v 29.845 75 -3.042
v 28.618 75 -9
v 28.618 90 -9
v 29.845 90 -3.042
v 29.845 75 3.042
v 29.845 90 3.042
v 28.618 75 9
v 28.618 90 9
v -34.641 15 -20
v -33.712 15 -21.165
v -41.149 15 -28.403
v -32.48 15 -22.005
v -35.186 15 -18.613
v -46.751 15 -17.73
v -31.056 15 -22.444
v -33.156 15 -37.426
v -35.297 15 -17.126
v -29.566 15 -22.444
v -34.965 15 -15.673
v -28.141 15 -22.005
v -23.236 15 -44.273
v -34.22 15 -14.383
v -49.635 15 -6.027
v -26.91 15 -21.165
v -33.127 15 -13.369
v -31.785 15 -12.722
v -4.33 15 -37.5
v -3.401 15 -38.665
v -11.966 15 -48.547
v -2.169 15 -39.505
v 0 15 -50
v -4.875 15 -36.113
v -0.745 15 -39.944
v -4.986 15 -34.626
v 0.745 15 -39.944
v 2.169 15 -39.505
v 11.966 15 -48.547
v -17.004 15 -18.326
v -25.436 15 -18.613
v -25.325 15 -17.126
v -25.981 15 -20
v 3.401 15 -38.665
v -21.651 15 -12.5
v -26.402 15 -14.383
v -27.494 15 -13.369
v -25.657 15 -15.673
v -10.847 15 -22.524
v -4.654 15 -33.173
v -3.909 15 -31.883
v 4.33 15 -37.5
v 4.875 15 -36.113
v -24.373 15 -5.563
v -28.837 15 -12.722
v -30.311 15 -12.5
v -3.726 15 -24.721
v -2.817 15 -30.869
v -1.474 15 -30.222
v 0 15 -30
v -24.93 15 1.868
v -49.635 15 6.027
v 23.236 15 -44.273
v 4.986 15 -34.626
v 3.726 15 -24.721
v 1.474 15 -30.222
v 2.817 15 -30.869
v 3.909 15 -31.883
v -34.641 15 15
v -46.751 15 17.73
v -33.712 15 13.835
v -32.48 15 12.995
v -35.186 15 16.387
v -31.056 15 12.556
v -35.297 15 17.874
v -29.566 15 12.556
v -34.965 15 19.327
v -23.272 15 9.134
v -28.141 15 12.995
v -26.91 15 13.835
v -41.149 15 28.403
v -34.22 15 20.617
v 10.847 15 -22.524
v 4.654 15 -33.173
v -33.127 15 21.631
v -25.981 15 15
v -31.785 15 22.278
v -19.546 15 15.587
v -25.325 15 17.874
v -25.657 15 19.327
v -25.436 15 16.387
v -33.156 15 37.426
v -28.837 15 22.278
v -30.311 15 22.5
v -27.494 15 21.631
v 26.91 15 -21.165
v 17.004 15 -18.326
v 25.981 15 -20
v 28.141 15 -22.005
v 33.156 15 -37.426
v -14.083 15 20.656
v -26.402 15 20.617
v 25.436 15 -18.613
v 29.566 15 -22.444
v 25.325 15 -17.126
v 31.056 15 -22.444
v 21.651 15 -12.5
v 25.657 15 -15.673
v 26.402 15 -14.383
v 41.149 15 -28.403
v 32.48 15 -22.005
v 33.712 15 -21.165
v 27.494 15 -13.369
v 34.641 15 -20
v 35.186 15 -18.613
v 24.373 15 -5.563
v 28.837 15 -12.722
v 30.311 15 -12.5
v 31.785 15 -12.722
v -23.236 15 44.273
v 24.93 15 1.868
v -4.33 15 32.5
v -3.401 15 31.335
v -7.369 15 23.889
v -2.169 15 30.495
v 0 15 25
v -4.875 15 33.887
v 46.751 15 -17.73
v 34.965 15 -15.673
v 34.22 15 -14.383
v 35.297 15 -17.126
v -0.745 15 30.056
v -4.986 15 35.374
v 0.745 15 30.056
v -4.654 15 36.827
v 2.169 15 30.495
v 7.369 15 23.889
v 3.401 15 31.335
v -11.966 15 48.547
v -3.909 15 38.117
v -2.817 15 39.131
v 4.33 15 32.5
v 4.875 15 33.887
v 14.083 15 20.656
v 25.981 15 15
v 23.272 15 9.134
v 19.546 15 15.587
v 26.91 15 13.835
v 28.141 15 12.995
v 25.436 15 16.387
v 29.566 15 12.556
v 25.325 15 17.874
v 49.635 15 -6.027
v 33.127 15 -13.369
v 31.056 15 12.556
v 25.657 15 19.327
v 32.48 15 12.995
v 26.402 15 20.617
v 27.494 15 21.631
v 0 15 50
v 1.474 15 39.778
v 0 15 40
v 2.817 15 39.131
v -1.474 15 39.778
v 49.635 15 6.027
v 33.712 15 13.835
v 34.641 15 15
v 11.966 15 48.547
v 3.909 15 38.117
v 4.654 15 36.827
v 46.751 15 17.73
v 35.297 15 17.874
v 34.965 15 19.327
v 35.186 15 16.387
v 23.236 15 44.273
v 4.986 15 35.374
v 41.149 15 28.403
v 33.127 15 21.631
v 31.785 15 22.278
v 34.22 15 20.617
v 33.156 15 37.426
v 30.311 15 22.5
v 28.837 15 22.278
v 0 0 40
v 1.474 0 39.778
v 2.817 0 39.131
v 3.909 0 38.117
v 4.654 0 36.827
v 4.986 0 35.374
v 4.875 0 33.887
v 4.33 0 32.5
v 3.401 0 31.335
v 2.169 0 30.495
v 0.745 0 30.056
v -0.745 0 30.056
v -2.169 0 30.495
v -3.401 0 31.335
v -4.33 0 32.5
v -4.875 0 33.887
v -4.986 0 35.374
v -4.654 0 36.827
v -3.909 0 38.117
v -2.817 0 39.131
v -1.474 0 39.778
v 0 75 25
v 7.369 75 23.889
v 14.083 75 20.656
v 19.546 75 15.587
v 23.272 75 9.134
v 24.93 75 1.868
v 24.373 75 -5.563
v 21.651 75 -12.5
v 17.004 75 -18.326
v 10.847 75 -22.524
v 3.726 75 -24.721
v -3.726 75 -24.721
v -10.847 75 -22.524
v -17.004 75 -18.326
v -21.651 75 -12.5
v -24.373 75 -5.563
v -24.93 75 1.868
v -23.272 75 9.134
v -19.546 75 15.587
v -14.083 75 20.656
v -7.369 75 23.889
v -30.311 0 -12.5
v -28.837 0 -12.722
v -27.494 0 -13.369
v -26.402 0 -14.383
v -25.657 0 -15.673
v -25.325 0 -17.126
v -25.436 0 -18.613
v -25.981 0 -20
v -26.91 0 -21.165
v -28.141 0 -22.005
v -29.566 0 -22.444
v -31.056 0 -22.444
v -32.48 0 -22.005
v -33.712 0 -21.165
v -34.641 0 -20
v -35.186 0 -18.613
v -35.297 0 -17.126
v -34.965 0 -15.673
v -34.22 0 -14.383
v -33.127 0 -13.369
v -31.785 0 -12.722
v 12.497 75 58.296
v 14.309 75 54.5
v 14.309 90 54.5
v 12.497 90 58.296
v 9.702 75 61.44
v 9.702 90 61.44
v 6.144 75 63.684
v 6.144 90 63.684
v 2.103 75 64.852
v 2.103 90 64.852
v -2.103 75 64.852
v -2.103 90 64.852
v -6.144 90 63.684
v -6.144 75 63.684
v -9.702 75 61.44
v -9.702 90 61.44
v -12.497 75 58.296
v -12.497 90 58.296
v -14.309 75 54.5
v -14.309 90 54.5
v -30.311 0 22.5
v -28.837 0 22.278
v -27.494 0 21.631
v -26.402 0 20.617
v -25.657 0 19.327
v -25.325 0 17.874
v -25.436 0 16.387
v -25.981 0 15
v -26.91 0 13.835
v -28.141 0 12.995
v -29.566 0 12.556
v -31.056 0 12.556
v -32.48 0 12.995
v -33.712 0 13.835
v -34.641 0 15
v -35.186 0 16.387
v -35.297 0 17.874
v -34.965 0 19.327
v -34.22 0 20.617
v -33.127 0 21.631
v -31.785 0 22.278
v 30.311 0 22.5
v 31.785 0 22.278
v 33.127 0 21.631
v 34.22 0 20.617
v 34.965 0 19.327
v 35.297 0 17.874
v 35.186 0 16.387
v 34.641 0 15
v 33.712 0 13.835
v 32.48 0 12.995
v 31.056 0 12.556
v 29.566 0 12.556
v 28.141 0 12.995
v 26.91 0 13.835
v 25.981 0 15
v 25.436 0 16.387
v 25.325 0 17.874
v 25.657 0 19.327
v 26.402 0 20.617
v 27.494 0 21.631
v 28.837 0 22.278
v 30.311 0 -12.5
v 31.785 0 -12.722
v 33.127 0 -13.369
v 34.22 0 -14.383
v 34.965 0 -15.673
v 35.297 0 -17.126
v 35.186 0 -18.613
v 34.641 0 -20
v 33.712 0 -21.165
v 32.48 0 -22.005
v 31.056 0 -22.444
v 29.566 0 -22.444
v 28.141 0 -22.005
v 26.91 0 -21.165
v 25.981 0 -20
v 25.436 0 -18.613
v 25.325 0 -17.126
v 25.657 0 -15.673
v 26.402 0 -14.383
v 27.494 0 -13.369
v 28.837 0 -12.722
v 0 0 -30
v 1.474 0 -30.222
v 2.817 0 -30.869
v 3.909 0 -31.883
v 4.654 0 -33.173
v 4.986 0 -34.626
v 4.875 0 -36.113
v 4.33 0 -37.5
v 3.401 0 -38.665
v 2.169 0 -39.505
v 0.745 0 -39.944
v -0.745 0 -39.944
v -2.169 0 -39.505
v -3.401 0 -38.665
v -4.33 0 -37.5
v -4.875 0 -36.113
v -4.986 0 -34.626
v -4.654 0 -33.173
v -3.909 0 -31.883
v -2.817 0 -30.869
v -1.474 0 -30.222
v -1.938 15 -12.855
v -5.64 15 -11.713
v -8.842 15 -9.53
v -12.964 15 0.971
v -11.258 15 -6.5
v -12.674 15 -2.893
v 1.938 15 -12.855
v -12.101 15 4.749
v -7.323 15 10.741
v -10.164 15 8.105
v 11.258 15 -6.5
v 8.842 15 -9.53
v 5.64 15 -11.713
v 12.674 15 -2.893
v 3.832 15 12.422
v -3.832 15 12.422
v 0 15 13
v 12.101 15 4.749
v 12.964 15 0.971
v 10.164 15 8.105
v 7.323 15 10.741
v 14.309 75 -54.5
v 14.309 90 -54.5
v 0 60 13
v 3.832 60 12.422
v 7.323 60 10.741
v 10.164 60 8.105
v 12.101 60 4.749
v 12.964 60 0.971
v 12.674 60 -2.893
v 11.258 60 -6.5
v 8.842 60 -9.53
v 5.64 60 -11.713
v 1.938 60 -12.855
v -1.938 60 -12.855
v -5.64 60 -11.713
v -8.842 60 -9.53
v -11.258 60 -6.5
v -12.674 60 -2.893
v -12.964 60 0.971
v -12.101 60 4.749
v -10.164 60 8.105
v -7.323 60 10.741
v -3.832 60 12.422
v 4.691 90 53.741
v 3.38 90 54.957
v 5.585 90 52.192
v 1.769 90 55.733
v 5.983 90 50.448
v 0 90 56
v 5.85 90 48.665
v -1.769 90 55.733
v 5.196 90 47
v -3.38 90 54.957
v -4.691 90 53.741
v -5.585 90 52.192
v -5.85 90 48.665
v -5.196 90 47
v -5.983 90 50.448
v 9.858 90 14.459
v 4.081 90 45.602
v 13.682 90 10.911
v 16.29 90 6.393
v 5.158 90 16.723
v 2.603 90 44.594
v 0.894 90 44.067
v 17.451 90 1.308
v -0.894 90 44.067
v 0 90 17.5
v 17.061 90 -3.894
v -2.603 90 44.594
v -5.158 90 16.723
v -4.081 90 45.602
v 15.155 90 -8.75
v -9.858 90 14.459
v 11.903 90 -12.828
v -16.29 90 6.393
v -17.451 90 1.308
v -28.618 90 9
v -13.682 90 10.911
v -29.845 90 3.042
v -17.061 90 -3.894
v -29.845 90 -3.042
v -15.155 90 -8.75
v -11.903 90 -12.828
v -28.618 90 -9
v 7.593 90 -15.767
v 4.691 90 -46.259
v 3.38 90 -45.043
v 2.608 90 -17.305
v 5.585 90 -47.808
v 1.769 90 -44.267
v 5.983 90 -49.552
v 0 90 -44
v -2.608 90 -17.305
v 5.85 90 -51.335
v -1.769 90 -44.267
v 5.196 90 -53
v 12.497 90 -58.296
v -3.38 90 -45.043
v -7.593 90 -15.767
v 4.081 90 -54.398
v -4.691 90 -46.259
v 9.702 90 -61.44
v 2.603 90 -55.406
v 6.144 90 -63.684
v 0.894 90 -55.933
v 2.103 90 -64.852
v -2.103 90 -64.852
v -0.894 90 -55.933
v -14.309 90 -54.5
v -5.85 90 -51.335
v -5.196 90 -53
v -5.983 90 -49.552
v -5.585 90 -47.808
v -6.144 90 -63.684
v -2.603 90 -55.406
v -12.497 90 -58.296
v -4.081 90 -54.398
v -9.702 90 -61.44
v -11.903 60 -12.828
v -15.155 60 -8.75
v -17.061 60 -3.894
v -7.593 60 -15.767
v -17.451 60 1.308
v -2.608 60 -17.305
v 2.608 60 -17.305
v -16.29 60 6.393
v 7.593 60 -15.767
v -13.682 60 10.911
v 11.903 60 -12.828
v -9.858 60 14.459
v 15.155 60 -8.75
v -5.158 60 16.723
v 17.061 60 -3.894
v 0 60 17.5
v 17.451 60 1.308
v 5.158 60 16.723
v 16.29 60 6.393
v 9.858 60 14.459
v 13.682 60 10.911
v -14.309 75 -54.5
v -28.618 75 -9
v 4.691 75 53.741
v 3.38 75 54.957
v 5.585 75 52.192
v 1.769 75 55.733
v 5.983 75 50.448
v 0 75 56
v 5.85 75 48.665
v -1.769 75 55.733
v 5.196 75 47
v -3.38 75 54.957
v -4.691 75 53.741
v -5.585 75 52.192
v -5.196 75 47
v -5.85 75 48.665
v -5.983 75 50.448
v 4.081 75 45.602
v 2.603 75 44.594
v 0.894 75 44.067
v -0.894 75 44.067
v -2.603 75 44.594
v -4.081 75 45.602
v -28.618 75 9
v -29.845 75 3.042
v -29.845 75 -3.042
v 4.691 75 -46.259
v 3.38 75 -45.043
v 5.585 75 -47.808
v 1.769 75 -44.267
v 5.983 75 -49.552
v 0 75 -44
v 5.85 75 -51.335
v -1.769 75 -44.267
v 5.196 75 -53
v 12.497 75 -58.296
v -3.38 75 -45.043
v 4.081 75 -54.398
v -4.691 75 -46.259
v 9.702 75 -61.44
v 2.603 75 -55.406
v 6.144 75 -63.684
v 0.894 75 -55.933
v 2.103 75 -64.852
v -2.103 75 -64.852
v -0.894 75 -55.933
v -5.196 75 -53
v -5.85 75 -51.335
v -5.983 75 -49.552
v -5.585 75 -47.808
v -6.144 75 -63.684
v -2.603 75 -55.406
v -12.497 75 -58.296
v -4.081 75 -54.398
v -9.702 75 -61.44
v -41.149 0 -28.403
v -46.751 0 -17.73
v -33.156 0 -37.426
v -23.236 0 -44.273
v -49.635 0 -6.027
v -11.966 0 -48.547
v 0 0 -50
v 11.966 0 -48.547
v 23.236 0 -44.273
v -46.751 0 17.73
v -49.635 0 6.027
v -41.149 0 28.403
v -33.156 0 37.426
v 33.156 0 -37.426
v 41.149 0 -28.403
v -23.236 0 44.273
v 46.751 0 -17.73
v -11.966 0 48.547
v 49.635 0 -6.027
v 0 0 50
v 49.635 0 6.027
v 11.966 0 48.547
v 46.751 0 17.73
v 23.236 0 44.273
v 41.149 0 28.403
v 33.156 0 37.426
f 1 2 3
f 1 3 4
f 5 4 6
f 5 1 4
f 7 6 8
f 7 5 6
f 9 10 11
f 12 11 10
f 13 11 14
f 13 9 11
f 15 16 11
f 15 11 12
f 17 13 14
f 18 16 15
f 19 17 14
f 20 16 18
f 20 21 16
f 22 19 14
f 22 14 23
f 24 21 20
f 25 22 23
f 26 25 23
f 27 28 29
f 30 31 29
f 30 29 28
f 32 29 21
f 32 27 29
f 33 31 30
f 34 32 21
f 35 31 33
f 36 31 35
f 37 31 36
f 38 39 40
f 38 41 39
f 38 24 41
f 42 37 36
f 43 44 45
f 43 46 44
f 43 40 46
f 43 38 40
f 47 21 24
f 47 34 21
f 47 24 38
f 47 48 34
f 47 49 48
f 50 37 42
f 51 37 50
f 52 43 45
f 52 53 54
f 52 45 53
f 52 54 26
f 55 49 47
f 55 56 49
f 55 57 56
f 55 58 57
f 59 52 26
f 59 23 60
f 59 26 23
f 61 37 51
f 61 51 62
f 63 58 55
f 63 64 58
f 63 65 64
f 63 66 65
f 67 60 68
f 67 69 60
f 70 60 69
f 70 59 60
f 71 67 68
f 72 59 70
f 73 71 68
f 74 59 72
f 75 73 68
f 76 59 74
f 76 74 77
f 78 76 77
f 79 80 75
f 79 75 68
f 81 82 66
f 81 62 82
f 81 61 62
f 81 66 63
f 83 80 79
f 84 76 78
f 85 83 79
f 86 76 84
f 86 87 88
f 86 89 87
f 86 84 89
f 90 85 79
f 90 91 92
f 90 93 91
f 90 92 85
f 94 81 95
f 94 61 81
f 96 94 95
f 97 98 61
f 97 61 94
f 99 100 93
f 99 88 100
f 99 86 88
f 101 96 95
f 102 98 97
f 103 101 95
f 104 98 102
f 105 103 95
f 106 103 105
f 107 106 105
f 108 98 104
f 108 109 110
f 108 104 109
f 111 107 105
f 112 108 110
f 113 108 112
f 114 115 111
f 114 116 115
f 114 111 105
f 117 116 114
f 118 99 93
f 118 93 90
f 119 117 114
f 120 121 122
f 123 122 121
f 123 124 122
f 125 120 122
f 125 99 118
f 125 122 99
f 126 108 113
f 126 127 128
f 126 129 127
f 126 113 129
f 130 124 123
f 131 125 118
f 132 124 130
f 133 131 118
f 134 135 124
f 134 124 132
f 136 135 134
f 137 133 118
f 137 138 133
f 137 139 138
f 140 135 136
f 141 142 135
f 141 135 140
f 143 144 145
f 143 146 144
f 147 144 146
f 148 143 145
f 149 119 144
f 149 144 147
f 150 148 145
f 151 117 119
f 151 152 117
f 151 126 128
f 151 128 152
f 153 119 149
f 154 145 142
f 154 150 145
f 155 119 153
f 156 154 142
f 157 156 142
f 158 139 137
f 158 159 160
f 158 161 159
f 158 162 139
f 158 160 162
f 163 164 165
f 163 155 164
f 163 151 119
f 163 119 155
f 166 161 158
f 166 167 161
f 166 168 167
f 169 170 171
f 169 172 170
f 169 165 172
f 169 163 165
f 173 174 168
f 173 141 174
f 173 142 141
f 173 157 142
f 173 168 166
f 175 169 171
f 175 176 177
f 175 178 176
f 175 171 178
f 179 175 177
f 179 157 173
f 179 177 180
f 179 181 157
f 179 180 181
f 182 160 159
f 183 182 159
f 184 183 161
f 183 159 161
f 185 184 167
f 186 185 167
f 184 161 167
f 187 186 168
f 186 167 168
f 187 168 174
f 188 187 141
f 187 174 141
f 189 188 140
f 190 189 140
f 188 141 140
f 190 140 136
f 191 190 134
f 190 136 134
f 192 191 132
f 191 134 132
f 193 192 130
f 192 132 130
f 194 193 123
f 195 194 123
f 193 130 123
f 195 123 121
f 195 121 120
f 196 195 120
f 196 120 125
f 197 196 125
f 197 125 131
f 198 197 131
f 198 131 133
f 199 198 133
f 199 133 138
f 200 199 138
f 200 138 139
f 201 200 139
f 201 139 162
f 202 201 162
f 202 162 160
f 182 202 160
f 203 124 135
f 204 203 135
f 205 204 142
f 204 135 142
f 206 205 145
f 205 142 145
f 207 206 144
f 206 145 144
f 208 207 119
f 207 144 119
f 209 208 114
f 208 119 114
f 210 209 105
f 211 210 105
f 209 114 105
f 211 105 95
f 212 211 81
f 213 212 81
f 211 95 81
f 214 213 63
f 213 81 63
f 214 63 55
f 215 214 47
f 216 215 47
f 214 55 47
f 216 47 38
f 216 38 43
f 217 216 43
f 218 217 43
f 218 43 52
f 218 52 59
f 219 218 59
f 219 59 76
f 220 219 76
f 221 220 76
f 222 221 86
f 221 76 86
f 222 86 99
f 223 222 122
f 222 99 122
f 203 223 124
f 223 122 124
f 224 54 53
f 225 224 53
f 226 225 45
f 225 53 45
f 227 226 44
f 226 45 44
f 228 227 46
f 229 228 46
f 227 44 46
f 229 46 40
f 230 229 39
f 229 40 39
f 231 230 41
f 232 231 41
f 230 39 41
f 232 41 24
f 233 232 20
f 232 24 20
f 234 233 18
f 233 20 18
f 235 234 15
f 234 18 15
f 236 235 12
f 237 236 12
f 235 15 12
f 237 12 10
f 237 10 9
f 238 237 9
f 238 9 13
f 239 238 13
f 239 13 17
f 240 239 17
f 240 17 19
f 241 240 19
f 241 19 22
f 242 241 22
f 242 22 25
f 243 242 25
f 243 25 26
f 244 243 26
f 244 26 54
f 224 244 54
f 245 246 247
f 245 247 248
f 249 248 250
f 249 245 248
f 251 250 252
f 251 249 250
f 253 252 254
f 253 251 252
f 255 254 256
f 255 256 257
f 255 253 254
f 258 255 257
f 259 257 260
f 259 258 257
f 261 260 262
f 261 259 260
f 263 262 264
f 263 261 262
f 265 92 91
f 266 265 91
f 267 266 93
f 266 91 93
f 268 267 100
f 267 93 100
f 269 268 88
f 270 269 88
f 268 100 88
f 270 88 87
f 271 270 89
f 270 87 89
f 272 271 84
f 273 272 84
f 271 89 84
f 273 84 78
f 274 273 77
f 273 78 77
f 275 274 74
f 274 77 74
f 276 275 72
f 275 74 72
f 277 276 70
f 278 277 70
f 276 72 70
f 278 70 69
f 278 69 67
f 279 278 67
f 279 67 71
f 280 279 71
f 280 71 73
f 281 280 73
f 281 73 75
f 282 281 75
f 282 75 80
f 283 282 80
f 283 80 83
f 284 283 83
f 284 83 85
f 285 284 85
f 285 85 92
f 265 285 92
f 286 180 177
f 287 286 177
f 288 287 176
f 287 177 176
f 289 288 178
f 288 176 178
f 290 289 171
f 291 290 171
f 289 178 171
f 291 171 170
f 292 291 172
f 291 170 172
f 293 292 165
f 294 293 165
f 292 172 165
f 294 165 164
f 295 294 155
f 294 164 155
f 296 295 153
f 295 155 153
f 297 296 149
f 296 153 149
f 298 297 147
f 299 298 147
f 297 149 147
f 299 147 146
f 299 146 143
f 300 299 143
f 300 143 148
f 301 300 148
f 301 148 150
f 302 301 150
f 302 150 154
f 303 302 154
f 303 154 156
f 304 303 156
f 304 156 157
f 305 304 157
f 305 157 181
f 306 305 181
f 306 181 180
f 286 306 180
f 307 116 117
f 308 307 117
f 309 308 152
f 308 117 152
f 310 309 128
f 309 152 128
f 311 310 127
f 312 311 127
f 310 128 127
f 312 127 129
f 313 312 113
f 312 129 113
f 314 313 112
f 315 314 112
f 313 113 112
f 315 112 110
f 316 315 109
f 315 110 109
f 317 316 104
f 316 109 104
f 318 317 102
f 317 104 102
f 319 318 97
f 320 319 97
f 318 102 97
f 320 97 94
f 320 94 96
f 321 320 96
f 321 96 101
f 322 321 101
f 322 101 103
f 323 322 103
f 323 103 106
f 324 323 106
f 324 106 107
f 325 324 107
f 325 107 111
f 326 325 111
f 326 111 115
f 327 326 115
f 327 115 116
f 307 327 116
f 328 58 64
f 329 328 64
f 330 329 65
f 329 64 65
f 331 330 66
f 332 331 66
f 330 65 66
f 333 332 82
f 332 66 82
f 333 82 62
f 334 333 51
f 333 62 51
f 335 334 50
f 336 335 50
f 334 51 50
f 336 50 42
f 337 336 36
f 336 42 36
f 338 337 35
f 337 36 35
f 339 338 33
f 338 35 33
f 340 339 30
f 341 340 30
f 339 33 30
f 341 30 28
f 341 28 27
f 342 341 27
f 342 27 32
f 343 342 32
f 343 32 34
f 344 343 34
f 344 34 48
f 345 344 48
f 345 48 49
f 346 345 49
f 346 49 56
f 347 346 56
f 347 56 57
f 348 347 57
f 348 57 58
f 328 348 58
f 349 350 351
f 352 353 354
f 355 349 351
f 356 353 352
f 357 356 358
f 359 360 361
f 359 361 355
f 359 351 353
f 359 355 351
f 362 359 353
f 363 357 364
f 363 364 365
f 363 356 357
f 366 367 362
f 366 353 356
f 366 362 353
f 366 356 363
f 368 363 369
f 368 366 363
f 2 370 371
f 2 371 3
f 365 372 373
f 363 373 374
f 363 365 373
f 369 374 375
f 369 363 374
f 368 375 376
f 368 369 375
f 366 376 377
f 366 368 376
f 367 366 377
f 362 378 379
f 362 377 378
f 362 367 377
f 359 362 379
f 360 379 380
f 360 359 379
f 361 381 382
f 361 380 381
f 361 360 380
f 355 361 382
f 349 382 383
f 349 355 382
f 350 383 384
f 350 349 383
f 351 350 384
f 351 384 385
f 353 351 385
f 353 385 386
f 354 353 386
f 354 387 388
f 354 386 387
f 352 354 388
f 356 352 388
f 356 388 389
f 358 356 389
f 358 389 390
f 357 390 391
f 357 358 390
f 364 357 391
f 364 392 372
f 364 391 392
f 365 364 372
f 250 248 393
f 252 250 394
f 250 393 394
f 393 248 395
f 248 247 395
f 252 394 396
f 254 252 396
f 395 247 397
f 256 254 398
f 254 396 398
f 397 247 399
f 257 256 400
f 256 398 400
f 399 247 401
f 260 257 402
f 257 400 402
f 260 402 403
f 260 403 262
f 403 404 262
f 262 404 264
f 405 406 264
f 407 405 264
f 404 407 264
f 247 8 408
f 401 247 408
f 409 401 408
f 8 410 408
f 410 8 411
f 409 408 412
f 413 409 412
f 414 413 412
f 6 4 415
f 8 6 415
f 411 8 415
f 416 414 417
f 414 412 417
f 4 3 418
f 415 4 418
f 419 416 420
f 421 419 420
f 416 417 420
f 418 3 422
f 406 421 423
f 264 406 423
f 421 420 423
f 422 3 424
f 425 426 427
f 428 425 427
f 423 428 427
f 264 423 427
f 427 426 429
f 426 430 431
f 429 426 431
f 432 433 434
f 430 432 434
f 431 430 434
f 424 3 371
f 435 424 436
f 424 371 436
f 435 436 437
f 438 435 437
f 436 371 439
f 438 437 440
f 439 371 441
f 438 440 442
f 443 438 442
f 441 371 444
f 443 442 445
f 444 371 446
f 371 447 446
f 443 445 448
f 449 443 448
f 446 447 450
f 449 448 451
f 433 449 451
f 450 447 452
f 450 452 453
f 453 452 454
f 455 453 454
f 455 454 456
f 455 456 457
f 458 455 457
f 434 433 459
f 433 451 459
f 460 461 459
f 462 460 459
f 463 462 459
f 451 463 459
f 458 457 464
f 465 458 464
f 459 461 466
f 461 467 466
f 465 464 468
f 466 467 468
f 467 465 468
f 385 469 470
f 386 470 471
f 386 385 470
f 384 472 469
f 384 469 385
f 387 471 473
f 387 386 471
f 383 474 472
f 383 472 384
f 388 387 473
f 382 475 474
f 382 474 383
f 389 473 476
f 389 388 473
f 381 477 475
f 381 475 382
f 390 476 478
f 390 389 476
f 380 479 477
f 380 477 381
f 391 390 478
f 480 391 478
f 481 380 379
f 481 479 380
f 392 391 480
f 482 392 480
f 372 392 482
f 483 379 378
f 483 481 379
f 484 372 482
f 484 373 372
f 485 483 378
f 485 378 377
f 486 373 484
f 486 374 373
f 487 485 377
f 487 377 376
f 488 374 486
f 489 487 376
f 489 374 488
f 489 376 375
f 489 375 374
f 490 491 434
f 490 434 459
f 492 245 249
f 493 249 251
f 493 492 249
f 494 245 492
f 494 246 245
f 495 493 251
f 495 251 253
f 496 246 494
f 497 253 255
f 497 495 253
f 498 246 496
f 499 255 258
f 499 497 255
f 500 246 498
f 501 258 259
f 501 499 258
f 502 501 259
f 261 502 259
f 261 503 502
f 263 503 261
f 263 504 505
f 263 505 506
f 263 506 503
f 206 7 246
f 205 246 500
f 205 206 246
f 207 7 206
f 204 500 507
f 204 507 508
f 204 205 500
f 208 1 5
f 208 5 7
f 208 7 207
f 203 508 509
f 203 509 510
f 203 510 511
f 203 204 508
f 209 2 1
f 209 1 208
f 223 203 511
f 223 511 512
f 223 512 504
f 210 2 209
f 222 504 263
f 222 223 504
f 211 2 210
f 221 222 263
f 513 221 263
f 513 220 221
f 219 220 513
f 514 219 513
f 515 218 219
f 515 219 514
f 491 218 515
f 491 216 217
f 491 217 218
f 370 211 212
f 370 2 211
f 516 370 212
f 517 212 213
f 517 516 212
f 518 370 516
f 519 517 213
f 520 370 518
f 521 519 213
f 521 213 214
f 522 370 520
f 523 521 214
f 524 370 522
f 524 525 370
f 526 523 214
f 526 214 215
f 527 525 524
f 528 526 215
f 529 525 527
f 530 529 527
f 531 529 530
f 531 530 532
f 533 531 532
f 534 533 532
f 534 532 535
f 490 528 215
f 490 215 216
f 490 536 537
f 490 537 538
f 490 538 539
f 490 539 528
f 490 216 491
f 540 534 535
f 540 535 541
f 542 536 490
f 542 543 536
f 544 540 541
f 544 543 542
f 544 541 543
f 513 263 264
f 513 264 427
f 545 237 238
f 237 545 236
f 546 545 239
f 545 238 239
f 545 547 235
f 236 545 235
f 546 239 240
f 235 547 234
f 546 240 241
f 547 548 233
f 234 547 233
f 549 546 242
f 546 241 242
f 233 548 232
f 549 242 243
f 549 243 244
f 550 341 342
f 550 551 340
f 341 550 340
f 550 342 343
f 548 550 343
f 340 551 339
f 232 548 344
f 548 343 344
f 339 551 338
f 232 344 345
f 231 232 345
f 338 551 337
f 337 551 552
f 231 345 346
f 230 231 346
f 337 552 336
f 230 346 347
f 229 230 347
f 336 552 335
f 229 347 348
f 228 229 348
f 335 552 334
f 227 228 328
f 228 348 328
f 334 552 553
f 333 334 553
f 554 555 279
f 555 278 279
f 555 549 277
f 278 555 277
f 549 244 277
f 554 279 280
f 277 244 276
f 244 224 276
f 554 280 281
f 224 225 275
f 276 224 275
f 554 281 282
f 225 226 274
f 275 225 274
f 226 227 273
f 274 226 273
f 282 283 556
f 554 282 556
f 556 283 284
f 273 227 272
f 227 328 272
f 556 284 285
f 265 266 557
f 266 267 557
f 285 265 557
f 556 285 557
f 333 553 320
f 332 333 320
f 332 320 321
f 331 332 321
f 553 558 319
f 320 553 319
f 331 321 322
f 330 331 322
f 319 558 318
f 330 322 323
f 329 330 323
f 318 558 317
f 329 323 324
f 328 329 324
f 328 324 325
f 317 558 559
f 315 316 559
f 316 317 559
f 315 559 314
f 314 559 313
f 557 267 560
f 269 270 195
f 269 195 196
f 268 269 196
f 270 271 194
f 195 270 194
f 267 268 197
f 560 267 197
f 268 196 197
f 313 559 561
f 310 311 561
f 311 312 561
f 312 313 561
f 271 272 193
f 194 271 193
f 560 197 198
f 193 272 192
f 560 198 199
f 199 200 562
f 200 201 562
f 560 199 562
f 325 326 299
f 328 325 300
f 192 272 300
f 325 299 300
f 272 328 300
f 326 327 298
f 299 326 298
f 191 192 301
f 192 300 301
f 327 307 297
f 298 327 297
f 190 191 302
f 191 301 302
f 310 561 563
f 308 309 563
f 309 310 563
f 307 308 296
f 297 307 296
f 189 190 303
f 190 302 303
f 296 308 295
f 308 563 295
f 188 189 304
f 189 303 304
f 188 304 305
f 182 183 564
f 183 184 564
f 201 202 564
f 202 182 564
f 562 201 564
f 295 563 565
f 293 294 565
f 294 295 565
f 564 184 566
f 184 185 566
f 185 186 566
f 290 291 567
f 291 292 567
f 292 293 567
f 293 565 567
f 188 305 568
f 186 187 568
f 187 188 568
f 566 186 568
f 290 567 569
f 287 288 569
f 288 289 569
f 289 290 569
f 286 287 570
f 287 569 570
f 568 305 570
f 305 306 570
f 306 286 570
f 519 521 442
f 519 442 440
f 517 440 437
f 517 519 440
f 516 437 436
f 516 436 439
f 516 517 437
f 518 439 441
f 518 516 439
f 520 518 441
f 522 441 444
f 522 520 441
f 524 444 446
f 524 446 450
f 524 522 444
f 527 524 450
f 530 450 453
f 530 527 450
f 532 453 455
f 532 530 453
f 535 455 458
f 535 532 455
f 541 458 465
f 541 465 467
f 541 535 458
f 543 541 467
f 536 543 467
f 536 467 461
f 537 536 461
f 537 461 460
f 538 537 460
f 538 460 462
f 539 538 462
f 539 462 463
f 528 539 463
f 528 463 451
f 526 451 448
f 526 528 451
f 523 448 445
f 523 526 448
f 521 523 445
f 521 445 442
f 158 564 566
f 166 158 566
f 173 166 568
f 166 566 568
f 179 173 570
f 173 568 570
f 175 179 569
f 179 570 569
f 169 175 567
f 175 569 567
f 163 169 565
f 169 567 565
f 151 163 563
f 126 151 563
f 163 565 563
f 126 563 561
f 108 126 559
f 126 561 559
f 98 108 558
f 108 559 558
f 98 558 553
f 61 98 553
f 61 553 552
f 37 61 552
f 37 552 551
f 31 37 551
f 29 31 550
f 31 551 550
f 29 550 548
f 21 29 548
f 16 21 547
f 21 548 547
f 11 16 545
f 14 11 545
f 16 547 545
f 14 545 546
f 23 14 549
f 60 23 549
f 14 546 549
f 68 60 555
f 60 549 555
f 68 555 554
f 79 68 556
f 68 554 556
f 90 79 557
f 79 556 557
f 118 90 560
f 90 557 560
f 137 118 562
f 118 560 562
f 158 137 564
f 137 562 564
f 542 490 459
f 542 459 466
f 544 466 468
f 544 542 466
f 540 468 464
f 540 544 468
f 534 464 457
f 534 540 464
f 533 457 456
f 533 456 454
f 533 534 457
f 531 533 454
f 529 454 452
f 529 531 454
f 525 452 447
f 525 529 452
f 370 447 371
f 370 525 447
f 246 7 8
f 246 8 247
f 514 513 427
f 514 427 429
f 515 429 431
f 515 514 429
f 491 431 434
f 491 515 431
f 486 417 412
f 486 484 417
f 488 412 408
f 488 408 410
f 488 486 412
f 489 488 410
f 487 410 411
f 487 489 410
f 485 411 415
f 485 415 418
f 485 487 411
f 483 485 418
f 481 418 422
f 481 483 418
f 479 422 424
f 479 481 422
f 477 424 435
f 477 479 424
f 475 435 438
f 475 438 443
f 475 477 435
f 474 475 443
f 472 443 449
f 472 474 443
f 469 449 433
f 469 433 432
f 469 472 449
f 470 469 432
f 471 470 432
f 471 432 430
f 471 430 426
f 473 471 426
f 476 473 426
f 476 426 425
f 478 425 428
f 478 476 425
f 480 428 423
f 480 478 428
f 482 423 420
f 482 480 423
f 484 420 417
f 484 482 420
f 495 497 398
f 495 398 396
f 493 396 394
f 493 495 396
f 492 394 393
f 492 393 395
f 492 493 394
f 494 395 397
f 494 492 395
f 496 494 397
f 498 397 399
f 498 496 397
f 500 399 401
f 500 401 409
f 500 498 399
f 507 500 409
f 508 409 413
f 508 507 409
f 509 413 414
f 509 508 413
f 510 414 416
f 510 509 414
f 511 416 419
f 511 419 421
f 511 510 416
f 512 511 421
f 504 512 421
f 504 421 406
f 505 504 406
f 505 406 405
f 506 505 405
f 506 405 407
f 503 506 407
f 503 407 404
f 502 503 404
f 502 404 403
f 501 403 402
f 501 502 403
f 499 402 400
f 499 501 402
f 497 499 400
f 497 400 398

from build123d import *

# Parameters (mm, degrees)
SKETCH1_R           = 50
BOSS_EXTRUDE1_DEPTH = 15
SKETCH2_R           = 5
CUT_EXTRUDE1_DEPTH  = 73.284161474
SKETCH3_R           = 25
SKETCH3_R_2         = 13
BOSS_EXTRUDE2_DEPTH = 60
SKETCH6_R           = 6
SKETCH6_R_2         = 17.5
BOSS_EXTRUDE3_DEPTH = 15
CUT_EXTRUDE2_START  = -30
SKETCH7_R           = 17.5
CUT_EXTRUDE2_DEPTH  = 30


with BuildPart() as part:
    # Sketch1 → Boss-Extrude1 (new body)
    with BuildSketch(Plane(origin=(0, 0, 0), x_dir=(1, 0, 0), z_dir=(0, 1, 0))):
        Circle(SKETCH1_R)
    extrude(amount=BOSS_EXTRUDE1_DEPTH)

    # Sketch2 → Cut-Extrude1 (cut, through all)
    with BuildSketch(Plane(origin=(0, 15, 0), x_dir=(1, 0, 0), z_dir=(0, 1, 0))):
        with Locations((0, 35)):
            Circle(SKETCH2_R)
        with Locations((30.310889132, 17.5)):
            Circle(SKETCH2_R)
        with Locations((30.310889132, -17.5)):
            Circle(SKETCH2_R)
        with Locations((0, -35)):
            Circle(SKETCH2_R)
        with Locations((-30.310889132, -17.5)):
            Circle(SKETCH2_R)
        with Locations((-30.310889132, 17.5)):
            Circle(SKETCH2_R)
    extrude(amount=-CUT_EXTRUDE1_DEPTH, mode=Mode.SUBTRACT)

    # Sketch3 → Boss-Extrude2 (add)
    with BuildSketch(Plane(origin=(0, 15, 0), x_dir=(1, 0, 0), z_dir=(0, 1, 0))):
        Circle(SKETCH3_R)
        Circle(SKETCH3_R_2, mode=Mode.SUBTRACT)
    extrude(amount=BOSS_EXTRUDE2_DEPTH)

    # Sketch6 → Boss-Extrude3 (add)
    with BuildSketch(Plane(origin=(0, 75, 0), x_dir=(1, 0, 0), z_dir=(0, 1, 0))):
        with BuildLine():
            Line((14.309088021, 54.5), (28.618176043, 9))
            ThreePointArc((28.618176043, 9), (30, 0), (28.618176043, -9))
            Line((28.618176043, -9), (14.309088021, -54.5))
            ThreePointArc((14.309088021, -54.5), (0, -65), (-14.309088021, -54.5))
            Line((-14.309088021, -54.5), (-28.618176043, -9))
            ThreePointArc((-28.618176043, -9), (-30, 0), (-28.618176043, 9))
            Line((-28.618176043, 9), (-14.309088021, 54.5))
            ThreePointArc((-14.309088021, 54.5), (0, 65), (14.309088021, 54.5))
        make_face()
        with Locations((0, -50)):
            Circle(SKETCH6_R, mode=Mode.SUBTRACT)
        with Locations((0, 50)):
            Circle(SKETCH6_R, mode=Mode.SUBTRACT)
        Circle(SKETCH6_R_2, mode=Mode.SUBTRACT)
    extrude(amount=BOSS_EXTRUDE3_DEPTH)

    # Sketch7 → Cut-Extrude2 (cut)
    with BuildSketch(Plane(origin=(0, 90, 0), x_dir=(1, 0, 0), z_dir=(0, 1, 0)).offset(CUT_EXTRUDE2_START)):
        Circle(SKETCH7_R)
    extrude(amount=CUT_EXTRUDE2_DEPTH, mode=Mode.SUBTRACT)


solid = part.part
